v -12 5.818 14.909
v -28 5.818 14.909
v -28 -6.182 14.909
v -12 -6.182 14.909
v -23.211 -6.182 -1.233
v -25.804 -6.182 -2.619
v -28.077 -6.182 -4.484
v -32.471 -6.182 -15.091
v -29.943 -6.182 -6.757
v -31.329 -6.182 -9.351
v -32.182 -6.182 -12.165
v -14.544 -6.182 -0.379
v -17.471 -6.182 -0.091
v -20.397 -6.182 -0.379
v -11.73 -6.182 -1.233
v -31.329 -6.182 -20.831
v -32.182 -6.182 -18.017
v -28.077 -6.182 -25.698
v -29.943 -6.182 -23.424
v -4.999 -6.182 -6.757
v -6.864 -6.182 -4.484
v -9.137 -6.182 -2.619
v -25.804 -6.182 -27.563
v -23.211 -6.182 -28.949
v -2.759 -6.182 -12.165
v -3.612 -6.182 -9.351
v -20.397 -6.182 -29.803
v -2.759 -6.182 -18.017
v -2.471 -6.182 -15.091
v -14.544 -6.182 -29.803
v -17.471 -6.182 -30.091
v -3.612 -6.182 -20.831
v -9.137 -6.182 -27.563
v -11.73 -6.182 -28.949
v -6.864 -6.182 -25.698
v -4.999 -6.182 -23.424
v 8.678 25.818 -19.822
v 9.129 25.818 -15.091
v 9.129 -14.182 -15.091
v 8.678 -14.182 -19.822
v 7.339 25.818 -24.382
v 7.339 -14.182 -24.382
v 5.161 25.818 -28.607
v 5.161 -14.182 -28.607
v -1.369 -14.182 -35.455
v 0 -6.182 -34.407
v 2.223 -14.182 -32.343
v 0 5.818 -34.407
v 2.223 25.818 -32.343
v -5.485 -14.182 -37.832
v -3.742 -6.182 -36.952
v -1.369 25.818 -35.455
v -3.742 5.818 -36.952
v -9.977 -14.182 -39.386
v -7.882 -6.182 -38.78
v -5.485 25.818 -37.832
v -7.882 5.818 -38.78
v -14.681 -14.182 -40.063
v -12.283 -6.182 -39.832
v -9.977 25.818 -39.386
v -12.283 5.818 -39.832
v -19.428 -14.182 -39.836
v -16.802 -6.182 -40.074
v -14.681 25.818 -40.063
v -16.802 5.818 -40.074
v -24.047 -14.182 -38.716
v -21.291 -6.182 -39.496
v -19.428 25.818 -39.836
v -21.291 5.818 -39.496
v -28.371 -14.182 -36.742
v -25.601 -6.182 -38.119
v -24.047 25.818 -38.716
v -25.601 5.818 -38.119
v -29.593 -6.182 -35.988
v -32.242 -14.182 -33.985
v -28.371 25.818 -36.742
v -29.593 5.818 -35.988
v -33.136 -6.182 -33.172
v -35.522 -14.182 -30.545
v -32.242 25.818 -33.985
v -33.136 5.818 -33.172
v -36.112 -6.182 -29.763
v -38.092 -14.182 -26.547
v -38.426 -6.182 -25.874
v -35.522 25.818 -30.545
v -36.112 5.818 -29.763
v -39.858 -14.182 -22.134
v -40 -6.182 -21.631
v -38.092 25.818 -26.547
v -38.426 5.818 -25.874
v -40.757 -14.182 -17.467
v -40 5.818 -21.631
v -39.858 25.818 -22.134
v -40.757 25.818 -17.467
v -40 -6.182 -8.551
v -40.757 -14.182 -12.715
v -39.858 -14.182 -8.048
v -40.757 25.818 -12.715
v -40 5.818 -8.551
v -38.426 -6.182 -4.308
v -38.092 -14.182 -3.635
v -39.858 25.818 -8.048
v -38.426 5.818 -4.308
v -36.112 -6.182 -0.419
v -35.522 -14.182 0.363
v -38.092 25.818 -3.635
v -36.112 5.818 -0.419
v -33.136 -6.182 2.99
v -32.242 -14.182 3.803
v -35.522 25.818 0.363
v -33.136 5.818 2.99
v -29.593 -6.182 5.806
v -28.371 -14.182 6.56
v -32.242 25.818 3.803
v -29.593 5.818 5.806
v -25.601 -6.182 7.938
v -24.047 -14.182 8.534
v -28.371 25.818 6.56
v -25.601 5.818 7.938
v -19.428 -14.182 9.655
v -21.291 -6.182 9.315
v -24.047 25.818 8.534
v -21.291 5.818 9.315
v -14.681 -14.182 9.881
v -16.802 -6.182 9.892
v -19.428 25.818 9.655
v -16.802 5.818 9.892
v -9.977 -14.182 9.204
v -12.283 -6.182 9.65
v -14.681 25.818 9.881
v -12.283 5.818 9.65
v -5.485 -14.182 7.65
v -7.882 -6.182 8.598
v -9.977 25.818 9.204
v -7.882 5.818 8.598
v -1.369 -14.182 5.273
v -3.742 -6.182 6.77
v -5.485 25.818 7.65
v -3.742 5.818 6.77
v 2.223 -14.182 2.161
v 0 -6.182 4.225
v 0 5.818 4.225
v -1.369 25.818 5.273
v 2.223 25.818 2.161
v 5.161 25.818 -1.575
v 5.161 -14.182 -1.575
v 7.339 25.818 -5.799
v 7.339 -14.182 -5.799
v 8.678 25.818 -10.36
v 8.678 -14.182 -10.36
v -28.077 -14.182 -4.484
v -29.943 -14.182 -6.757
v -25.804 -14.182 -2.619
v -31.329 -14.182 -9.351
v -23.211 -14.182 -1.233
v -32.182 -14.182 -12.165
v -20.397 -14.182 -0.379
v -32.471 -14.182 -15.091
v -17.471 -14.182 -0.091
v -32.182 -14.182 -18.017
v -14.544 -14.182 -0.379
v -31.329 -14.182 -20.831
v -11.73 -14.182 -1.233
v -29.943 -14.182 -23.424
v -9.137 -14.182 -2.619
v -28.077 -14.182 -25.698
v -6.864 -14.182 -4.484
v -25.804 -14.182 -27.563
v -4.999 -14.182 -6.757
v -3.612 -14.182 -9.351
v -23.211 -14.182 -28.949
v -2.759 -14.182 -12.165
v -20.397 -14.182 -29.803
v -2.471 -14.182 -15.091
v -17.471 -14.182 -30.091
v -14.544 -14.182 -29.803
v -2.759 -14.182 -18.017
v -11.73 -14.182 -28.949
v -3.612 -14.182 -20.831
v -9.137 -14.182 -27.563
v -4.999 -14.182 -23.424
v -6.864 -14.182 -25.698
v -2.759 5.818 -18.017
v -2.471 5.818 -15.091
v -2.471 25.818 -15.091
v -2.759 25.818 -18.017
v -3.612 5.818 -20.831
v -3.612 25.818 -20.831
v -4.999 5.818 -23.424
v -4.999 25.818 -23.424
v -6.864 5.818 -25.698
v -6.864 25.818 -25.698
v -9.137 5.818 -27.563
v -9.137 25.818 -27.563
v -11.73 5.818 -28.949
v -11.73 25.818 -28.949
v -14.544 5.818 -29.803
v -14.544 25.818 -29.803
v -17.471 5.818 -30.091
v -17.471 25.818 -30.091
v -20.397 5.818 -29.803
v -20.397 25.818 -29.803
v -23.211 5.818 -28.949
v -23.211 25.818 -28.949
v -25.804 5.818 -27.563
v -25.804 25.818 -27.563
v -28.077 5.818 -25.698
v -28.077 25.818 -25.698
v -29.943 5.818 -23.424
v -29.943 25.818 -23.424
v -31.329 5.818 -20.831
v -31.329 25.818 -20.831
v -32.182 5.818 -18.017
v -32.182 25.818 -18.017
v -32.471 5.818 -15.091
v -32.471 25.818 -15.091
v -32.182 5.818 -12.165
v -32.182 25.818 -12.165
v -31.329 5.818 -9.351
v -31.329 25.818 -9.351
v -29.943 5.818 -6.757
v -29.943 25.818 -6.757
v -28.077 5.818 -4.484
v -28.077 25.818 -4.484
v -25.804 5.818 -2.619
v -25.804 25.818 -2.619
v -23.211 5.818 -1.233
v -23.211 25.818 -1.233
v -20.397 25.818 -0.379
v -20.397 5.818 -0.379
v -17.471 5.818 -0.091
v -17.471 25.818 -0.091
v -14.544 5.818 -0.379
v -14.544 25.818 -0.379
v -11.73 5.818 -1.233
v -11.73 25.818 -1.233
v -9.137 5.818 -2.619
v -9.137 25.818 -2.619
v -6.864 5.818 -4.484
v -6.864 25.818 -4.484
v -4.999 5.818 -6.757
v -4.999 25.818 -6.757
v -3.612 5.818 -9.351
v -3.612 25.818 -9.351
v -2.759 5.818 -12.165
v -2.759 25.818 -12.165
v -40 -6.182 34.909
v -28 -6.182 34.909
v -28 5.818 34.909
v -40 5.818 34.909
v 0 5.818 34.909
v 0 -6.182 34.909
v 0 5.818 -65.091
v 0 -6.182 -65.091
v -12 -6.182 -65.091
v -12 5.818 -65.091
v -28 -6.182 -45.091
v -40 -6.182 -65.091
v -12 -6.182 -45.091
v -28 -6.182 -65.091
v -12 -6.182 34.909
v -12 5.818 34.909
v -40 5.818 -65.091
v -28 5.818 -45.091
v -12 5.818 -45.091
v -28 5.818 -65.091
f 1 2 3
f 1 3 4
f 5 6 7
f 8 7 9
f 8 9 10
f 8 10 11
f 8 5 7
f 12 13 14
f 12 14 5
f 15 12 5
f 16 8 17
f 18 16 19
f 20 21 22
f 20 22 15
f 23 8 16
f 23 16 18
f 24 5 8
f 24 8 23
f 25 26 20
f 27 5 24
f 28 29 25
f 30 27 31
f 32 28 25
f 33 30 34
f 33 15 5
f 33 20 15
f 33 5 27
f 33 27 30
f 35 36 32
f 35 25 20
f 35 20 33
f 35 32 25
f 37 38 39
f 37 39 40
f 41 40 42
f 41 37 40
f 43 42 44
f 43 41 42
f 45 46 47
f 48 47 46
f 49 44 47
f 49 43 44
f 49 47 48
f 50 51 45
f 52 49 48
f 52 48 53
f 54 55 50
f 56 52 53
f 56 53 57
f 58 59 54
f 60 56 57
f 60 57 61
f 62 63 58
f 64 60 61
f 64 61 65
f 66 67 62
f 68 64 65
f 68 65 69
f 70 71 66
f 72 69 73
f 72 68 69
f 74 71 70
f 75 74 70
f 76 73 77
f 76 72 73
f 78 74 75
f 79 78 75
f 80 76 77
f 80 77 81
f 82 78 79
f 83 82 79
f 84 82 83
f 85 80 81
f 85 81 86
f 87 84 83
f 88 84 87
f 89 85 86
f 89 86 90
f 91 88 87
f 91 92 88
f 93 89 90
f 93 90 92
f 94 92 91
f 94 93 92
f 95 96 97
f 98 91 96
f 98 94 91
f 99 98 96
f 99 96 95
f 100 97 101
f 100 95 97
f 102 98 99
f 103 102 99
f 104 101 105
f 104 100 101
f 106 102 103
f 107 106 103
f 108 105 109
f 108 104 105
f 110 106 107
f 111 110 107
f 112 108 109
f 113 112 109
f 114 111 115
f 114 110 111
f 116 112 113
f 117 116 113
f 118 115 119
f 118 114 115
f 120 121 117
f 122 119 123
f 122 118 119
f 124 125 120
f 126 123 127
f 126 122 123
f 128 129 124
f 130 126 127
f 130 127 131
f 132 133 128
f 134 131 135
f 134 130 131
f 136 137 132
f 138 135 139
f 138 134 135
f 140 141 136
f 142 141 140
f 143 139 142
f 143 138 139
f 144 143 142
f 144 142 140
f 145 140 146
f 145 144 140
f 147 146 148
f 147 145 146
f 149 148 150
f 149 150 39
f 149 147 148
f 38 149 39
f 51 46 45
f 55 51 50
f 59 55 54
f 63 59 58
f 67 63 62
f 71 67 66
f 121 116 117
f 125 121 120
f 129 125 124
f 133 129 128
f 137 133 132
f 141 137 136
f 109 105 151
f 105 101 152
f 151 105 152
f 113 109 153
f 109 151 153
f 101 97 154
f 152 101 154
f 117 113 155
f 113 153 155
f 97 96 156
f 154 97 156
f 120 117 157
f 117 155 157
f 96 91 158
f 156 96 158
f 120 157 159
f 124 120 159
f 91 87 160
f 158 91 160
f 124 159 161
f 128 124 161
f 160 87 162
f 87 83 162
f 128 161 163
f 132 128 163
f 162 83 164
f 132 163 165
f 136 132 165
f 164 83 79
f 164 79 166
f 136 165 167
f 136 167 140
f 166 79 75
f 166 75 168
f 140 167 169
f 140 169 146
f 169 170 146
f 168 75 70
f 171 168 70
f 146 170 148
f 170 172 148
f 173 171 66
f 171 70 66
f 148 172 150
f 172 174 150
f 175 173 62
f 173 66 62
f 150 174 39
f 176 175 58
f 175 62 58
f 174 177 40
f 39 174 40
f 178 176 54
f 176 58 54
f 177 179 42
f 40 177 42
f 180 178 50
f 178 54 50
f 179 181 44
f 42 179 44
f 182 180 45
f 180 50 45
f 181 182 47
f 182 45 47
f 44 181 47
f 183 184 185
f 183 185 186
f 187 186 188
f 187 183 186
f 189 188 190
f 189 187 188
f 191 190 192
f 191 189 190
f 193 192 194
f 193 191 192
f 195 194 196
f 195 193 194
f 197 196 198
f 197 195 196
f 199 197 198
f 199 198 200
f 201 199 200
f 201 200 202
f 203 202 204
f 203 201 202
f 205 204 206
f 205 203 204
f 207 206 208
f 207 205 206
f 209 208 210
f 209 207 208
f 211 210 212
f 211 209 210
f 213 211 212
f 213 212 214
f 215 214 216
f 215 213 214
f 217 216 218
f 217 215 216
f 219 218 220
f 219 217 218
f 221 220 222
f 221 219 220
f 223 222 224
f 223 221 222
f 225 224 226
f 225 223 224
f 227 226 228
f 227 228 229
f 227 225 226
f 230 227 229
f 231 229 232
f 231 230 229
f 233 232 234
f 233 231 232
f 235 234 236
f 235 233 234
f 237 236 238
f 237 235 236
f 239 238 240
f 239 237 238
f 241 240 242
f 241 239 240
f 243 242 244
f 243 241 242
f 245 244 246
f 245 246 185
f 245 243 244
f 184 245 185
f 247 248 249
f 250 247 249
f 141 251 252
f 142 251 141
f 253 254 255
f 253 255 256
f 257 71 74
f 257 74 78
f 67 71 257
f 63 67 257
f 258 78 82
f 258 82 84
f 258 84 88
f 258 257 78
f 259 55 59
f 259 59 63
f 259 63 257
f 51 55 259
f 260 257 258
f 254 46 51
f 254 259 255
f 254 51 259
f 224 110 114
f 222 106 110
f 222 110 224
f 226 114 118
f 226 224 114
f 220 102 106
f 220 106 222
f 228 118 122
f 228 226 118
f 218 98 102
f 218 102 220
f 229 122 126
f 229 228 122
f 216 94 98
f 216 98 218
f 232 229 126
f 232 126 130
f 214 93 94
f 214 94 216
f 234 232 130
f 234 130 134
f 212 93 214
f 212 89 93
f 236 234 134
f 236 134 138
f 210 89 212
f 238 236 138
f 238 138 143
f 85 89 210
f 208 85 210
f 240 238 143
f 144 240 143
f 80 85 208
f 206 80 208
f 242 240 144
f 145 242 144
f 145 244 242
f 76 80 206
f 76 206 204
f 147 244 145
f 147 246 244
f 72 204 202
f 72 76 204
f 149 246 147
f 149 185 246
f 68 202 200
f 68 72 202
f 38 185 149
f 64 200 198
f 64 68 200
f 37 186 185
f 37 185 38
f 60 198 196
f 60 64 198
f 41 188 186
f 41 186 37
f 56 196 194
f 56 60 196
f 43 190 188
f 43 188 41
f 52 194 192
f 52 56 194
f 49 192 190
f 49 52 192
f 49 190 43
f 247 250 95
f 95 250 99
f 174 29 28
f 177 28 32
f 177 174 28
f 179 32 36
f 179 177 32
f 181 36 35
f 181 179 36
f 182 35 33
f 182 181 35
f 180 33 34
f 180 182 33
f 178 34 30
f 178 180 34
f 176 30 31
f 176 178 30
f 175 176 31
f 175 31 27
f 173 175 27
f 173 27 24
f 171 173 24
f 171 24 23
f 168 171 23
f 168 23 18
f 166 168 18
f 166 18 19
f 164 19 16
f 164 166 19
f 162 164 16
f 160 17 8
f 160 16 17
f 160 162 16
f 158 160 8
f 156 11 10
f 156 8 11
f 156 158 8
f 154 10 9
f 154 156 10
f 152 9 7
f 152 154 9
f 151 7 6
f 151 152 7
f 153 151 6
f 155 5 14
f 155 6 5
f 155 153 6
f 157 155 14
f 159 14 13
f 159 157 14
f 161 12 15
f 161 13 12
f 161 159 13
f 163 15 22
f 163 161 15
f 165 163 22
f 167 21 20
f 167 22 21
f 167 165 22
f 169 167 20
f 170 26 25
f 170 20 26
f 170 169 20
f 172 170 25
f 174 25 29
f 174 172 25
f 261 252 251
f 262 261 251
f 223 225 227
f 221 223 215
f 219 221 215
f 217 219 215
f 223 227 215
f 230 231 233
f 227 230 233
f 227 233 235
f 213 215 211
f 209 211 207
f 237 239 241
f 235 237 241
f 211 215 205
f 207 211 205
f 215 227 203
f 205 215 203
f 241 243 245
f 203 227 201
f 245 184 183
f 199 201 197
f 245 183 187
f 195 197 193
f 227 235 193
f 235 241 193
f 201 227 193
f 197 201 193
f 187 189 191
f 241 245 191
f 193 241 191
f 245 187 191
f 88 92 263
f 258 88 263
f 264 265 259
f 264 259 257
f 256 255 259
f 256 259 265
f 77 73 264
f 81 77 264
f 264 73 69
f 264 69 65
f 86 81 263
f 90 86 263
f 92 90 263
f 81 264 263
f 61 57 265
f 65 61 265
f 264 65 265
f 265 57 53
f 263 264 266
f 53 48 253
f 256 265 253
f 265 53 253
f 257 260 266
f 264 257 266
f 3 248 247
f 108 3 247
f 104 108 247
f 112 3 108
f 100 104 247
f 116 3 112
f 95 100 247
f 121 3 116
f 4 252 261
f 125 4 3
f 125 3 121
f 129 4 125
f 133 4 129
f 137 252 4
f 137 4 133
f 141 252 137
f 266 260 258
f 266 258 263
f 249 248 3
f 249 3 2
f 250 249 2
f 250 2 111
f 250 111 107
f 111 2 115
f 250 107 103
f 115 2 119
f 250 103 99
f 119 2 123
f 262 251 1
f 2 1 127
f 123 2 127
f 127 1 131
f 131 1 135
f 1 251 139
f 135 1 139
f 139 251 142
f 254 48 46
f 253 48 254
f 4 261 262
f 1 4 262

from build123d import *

# Parameters (mm, degrees)
SKETCH1_W           = 100
SKETCH1_H           = 12
BOSS_EXTRUDE1_DEPTH = 40
SKETCH3_R           = 25
SKETCH3_R_2         = 15
BOSS_EXTRUDE3_DEPTH = 20
SKETCH8_W           = 16
SKETCH8_H           = 12
CUT_EXTRUDE3_DEPTH  = 20
SKETCH9_W           = 16
SKETCH9_H           = 12
CUT_EXTRUDE4_DEPTH  = 20


with BuildPart() as part:
    # Sketch1 → Boss-Extrude1 (new body)
    with BuildSketch(Plane(origin=(0, 0, 0), x_dir=(0, 0, -1), z_dir=(1, 0, 0))):
        with Locations((15.090909091, -0.181818182)):
            Rectangle(SKETCH1_W, SKETCH1_H)
    extrude(amount=-BOSS_EXTRUDE1_DEPTH)

    # Sketch3 → Boss-Extrude3 (add, symmetric)
    with BuildSketch(Plane(origin=(0, 5.818181818, 0), x_dir=(1, 0, 0), z_dir=(0, 1, 0))):
        with Locations((-15.870623847, 15.090909091)):
            Circle(SKETCH3_R)
        with Locations((-17.470623847, 15.090909091)):
            Circle(SKETCH3_R_2, mode=Mode.SUBTRACT)
    extrude(amount=BOSS_EXTRUDE3_DEPTH, both=True)

    # Sketch8 → Cut-Extrude3 (cut)
    with BuildSketch(Plane.XY.offset(34.909090909)):
        with Locations((-20, -0.181818182)):
            Rectangle(SKETCH8_W, SKETCH8_H)
    extrude(amount=-CUT_EXTRUDE3_DEPTH, mode=Mode.SUBTRACT)

    # Sketch9 → Cut-Extrude4 (cut)
    with BuildSketch(Plane(origin=(0, 0, -65.090909091), x_dir=(-1, 0, 0), z_dir=(0, 0, -1))):
        with Locations((20, -0.181818182)):
            Rectangle(SKETCH9_W, SKETCH9_H)
    extrude(amount=-CUT_EXTRUDE4_DEPTH, mode=Mode.SUBTRACT)


solid = part.part
